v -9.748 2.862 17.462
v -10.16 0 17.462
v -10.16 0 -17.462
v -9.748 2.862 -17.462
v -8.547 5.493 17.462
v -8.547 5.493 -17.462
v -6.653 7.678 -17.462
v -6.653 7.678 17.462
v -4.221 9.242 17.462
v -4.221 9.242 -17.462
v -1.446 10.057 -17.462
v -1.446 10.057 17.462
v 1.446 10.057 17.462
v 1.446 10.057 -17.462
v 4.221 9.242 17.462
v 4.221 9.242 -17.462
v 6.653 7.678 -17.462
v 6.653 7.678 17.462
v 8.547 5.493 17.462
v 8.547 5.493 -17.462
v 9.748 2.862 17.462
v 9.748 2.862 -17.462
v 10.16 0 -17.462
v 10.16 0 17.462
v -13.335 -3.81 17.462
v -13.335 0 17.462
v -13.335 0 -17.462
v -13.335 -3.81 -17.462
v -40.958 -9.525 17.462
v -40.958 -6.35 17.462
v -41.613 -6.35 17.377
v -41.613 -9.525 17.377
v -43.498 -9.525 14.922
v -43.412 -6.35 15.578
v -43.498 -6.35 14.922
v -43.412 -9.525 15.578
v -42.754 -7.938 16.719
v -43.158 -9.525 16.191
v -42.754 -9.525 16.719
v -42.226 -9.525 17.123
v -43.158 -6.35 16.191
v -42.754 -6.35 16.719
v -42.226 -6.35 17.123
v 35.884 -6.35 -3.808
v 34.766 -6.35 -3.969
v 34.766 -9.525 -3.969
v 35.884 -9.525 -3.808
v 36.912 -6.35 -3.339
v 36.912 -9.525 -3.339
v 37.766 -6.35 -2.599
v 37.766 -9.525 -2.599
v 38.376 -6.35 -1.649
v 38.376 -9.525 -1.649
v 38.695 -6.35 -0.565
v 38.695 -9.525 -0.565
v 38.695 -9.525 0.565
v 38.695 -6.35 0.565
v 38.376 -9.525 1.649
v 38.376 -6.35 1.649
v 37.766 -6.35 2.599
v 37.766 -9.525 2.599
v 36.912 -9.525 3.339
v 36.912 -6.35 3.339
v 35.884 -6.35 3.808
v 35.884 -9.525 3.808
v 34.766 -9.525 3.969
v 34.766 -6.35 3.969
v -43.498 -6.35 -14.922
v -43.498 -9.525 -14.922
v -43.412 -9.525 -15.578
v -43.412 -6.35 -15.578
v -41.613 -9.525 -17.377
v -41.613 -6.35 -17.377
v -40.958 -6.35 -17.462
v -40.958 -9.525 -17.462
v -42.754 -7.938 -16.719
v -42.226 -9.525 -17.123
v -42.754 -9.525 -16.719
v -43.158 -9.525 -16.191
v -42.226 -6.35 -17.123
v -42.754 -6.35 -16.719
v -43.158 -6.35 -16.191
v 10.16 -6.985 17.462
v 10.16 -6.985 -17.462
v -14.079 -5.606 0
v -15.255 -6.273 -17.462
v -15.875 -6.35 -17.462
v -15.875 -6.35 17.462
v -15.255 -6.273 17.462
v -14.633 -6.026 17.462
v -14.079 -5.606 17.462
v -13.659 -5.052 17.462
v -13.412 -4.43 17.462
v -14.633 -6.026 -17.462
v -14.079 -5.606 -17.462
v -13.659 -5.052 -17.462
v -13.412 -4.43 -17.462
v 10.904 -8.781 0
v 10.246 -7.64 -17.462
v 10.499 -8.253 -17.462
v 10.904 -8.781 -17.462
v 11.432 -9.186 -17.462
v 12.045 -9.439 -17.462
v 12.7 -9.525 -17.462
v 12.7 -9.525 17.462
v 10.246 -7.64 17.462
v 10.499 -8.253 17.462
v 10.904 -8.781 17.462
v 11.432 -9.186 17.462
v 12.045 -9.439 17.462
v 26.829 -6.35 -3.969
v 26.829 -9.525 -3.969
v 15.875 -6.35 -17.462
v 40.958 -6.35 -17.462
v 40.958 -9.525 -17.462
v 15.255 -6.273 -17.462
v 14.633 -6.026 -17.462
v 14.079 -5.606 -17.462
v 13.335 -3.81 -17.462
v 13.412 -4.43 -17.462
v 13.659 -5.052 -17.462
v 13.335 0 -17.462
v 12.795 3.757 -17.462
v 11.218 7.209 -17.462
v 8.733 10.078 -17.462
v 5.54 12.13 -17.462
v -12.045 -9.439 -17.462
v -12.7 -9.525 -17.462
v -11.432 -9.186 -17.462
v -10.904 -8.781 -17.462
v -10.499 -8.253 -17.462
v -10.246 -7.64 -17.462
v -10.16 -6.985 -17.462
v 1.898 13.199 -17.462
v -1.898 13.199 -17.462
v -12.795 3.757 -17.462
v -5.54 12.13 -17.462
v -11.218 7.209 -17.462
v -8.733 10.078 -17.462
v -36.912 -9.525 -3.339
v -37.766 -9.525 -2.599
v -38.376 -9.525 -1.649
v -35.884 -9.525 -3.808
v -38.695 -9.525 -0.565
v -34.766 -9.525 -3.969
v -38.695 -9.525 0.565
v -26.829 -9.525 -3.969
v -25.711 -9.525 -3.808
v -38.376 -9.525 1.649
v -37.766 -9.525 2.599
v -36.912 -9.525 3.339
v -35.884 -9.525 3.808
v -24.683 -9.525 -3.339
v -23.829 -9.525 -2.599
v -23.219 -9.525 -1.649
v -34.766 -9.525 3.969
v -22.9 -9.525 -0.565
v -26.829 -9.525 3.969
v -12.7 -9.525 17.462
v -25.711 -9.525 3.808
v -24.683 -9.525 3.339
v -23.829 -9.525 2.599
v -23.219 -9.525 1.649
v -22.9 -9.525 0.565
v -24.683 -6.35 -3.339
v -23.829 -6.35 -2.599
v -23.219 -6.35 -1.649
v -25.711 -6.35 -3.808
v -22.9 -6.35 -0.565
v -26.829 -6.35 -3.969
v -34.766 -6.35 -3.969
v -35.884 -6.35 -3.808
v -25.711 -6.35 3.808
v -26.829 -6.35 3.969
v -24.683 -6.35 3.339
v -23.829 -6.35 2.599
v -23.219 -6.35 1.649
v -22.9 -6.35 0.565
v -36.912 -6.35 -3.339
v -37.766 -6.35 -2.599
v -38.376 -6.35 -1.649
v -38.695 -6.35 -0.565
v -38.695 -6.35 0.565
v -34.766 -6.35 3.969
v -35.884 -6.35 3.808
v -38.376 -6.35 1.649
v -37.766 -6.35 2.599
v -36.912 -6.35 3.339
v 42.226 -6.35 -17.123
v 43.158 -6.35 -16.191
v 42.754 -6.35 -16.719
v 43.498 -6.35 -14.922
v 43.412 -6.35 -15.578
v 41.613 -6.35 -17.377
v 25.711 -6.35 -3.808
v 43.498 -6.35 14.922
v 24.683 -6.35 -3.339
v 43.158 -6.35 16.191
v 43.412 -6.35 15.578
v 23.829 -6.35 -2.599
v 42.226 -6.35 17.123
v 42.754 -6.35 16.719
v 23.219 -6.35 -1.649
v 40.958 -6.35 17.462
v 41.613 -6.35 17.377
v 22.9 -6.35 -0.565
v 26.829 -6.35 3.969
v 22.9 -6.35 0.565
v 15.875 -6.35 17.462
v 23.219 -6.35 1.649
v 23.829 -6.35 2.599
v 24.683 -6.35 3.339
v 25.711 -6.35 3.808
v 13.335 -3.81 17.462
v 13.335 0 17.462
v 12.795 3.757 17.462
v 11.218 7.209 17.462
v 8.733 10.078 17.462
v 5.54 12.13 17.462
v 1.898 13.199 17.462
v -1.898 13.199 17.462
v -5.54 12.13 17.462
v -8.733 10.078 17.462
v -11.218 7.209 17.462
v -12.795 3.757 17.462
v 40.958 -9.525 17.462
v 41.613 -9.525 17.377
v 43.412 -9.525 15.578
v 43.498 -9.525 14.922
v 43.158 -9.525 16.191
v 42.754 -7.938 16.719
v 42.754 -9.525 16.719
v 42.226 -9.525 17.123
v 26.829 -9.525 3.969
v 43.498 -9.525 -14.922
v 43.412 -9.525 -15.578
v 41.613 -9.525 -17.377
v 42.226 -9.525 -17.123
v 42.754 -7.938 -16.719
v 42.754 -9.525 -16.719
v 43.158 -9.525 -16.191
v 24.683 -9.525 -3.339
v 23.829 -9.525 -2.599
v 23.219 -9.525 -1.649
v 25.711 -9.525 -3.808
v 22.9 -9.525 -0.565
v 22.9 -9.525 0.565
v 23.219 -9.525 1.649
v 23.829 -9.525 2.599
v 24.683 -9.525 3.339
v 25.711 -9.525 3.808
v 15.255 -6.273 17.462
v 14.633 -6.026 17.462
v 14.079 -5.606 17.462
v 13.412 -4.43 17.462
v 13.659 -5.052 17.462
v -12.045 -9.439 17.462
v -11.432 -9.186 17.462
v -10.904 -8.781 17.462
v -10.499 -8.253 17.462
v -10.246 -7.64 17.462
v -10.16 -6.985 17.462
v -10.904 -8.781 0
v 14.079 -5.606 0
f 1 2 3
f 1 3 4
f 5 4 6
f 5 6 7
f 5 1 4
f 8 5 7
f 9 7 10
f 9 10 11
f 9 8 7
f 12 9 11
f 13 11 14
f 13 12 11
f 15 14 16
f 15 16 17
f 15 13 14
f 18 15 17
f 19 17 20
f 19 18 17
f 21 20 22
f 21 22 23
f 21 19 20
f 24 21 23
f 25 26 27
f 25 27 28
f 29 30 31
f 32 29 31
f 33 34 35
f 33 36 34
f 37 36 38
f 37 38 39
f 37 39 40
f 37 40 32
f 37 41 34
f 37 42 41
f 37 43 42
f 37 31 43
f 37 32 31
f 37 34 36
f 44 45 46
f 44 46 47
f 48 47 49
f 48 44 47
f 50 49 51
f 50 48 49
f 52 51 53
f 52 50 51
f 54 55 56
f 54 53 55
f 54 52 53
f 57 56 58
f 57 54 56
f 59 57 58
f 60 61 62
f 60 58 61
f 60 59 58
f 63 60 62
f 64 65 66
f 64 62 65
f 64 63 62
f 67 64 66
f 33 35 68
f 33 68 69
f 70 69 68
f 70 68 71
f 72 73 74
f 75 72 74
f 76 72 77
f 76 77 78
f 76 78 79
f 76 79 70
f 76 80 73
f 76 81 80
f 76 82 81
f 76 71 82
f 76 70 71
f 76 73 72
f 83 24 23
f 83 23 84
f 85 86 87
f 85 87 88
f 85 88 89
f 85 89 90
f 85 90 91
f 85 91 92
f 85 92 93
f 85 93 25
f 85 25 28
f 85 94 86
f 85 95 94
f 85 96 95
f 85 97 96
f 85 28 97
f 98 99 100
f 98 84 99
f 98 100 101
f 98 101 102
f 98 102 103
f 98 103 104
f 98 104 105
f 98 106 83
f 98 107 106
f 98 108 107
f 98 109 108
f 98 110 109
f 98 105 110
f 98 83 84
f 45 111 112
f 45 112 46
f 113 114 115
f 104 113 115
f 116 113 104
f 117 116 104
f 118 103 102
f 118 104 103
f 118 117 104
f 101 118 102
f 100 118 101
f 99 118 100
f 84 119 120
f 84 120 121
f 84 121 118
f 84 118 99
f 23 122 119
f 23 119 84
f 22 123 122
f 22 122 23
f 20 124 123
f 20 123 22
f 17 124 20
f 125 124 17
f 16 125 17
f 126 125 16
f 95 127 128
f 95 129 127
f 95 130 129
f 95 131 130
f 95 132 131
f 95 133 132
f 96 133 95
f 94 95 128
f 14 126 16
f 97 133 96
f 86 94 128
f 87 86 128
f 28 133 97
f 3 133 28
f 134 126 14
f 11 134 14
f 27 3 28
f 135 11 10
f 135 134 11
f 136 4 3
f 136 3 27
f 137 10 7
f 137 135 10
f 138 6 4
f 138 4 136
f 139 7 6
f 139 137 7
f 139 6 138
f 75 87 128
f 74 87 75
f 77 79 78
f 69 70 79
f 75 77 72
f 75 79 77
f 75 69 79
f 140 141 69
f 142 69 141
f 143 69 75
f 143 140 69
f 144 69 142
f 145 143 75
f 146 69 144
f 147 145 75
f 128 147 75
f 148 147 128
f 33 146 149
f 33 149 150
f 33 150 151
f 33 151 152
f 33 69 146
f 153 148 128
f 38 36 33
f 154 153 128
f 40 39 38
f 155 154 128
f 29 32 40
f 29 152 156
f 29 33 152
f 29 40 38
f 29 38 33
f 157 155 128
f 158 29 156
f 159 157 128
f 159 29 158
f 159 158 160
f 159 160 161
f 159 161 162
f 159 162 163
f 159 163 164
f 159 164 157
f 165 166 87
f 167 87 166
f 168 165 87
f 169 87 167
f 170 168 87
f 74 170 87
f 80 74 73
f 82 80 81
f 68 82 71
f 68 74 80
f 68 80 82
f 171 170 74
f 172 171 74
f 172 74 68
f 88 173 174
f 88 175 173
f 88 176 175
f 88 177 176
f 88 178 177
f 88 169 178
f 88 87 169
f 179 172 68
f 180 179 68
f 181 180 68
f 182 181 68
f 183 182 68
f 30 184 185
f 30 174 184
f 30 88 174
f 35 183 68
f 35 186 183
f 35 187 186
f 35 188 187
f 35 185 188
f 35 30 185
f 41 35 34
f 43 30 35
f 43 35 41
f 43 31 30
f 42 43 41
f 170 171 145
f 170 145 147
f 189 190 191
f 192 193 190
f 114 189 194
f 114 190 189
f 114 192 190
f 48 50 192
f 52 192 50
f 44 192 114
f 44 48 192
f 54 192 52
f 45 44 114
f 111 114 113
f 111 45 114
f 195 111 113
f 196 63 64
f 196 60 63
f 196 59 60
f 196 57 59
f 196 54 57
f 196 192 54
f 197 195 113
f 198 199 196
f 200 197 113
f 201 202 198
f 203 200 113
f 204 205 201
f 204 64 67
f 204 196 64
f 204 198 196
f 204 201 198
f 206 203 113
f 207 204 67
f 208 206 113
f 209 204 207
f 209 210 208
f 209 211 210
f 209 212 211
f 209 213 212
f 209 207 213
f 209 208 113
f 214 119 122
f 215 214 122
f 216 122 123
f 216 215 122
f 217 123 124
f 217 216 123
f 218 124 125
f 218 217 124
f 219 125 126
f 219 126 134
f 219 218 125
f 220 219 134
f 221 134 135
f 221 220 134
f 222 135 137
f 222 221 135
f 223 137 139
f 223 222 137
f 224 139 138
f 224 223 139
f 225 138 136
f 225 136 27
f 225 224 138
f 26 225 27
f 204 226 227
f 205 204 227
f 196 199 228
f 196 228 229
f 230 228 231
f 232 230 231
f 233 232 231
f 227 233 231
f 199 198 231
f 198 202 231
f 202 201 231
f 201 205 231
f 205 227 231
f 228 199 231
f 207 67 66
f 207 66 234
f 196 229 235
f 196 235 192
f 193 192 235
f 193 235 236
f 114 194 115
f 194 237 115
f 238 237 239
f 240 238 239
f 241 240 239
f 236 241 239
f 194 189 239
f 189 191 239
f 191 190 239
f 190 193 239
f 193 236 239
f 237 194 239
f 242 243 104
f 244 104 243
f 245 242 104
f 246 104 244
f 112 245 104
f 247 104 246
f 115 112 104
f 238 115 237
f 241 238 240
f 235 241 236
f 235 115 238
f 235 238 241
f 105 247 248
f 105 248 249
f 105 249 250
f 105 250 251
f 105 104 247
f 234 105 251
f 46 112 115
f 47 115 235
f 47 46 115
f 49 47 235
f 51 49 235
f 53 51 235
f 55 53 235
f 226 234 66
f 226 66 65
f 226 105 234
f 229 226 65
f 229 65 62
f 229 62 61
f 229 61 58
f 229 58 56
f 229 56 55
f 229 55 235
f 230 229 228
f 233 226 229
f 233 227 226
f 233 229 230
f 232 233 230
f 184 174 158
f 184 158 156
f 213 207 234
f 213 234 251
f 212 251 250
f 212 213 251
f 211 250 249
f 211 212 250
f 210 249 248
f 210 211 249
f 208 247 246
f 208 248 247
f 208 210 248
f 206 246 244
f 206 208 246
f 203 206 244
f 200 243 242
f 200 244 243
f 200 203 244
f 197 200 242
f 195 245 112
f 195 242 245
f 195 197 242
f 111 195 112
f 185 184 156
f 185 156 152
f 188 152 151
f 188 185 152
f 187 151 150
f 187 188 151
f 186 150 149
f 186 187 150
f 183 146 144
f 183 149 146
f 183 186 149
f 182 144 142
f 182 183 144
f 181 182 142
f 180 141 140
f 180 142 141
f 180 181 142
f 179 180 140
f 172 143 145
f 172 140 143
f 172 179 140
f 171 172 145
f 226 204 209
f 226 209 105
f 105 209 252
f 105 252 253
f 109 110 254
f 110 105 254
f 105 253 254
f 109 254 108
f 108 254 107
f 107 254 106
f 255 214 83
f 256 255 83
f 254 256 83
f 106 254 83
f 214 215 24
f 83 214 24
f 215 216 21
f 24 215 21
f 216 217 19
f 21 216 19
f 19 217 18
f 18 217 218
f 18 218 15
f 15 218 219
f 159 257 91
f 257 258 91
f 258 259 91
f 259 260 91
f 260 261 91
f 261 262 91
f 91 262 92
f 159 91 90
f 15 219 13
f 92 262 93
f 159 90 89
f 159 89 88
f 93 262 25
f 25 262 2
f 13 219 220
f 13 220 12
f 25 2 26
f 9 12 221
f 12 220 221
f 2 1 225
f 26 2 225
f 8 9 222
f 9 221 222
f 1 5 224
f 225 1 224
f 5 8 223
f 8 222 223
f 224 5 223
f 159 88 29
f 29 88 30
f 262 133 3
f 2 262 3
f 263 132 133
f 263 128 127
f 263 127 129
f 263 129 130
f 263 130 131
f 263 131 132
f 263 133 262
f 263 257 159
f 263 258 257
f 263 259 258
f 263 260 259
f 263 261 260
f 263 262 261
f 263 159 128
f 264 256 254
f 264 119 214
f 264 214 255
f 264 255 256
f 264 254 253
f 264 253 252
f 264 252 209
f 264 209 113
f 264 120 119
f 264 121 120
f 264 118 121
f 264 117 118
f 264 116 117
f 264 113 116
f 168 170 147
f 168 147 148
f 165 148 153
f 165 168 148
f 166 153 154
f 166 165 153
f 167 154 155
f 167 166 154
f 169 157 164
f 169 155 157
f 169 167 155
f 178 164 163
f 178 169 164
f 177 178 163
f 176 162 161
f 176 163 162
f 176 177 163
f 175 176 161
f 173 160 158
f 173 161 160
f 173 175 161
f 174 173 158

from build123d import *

# Parameters (mm, degrees)
BOSS_EXTRUDE1_DEPTH = 17.4625
VARFILLET1_R        = 2.54
CUT_EXTRUDE1_DEPTH  = 34.925


with BuildPart() as part:
    # Sketch1 → Boss-Extrude1 (new, symmetric)
    with BuildSketch(Plane.XY):
        with BuildLine():
            Line((-13.335, 0), (-13.335, -6.35))
            Line((-13.335, -6.35), (-43.4975, -6.35))
            Line((-43.4975, -6.35), (-43.4975, -9.525))
            Line((-43.4975, -9.525), (-10.16, -9.525))
            Line((-10.16, -9.525), (-10.16, 0))
            ThreePointArc((-10.16, 0), (3e-07, 10.16), (10.16, -6e-07))
            Line((10.16, -6e-07), (10.16, -9.525))
            Line((10.16, -9.525), (43.4975, -9.525))
            Line((43.4975, -9.525), (43.4975, -6.35))
            Line((43.4975, -6.35), (13.335, -6.35))
            Line((13.335, -6.35), (13.335, 0))
            ThreePointArc((13.335, 0), (0, 13.335), (-13.335, 0))
        make_face()
    extrude(amount=BOSS_EXTRUDE1_DEPTH, both=True)

    # VarFillet1
    varfillet1_edges = [part.edges().sort_by_distance(p)[0] for p in [
        (13.335, -6.35, 0),
        (-13.335, -6.35, 0),
        (10.16, -9.525, 0),
        (-10.16, -9.525, 0),
        (-43.4975, -7.9375, -17.4625),
        (-43.4975, -7.9375, 17.4625),
        (43.4975, -7.9375, -17.4625),
        (43.4975, -7.9375, 17.4625),
    ]]
    fillet(varfillet1_edges, radius=VARFILLET1_R)

    # Sketch2 → Cut-Extrude1 (cut)
    with BuildSketch(Plane(origin=(0, 0, 0), x_dir=(1, 0, 0), z_dir=(0, 1, 0))):
        with BuildLine():
            Line((-34.76625, 3.96875), (-26.82875, 3.96875))
            ThreePointArc((-26.82875, 3.96875), (-22.86, 0), (-26.82875, -3.96875))
            Line((-26.82875, -3.96875), (-34.76625, -3.96875))
            ThreePointArc((-34.76625, -3.96875), (-38.735, 0), (-34.76625, 3.96875))
        make_face()
        with BuildLine():
            Line((34.76625, -3.96875), (26.82875, -3.96875))
            ThreePointArc((26.82875, -3.96875), (22.86, 0), (26.82875, 3.96875))
            Line((26.82875, 3.96875), (34.76625, 3.96875))
            ThreePointArc((34.76625, 3.96875), (38.735, 0), (34.76625, -3.96875))
        make_face()
    extrude(amount=-CUT_EXTRUDE1_DEPTH, mode=Mode.SUBTRACT)


solid = part.part
